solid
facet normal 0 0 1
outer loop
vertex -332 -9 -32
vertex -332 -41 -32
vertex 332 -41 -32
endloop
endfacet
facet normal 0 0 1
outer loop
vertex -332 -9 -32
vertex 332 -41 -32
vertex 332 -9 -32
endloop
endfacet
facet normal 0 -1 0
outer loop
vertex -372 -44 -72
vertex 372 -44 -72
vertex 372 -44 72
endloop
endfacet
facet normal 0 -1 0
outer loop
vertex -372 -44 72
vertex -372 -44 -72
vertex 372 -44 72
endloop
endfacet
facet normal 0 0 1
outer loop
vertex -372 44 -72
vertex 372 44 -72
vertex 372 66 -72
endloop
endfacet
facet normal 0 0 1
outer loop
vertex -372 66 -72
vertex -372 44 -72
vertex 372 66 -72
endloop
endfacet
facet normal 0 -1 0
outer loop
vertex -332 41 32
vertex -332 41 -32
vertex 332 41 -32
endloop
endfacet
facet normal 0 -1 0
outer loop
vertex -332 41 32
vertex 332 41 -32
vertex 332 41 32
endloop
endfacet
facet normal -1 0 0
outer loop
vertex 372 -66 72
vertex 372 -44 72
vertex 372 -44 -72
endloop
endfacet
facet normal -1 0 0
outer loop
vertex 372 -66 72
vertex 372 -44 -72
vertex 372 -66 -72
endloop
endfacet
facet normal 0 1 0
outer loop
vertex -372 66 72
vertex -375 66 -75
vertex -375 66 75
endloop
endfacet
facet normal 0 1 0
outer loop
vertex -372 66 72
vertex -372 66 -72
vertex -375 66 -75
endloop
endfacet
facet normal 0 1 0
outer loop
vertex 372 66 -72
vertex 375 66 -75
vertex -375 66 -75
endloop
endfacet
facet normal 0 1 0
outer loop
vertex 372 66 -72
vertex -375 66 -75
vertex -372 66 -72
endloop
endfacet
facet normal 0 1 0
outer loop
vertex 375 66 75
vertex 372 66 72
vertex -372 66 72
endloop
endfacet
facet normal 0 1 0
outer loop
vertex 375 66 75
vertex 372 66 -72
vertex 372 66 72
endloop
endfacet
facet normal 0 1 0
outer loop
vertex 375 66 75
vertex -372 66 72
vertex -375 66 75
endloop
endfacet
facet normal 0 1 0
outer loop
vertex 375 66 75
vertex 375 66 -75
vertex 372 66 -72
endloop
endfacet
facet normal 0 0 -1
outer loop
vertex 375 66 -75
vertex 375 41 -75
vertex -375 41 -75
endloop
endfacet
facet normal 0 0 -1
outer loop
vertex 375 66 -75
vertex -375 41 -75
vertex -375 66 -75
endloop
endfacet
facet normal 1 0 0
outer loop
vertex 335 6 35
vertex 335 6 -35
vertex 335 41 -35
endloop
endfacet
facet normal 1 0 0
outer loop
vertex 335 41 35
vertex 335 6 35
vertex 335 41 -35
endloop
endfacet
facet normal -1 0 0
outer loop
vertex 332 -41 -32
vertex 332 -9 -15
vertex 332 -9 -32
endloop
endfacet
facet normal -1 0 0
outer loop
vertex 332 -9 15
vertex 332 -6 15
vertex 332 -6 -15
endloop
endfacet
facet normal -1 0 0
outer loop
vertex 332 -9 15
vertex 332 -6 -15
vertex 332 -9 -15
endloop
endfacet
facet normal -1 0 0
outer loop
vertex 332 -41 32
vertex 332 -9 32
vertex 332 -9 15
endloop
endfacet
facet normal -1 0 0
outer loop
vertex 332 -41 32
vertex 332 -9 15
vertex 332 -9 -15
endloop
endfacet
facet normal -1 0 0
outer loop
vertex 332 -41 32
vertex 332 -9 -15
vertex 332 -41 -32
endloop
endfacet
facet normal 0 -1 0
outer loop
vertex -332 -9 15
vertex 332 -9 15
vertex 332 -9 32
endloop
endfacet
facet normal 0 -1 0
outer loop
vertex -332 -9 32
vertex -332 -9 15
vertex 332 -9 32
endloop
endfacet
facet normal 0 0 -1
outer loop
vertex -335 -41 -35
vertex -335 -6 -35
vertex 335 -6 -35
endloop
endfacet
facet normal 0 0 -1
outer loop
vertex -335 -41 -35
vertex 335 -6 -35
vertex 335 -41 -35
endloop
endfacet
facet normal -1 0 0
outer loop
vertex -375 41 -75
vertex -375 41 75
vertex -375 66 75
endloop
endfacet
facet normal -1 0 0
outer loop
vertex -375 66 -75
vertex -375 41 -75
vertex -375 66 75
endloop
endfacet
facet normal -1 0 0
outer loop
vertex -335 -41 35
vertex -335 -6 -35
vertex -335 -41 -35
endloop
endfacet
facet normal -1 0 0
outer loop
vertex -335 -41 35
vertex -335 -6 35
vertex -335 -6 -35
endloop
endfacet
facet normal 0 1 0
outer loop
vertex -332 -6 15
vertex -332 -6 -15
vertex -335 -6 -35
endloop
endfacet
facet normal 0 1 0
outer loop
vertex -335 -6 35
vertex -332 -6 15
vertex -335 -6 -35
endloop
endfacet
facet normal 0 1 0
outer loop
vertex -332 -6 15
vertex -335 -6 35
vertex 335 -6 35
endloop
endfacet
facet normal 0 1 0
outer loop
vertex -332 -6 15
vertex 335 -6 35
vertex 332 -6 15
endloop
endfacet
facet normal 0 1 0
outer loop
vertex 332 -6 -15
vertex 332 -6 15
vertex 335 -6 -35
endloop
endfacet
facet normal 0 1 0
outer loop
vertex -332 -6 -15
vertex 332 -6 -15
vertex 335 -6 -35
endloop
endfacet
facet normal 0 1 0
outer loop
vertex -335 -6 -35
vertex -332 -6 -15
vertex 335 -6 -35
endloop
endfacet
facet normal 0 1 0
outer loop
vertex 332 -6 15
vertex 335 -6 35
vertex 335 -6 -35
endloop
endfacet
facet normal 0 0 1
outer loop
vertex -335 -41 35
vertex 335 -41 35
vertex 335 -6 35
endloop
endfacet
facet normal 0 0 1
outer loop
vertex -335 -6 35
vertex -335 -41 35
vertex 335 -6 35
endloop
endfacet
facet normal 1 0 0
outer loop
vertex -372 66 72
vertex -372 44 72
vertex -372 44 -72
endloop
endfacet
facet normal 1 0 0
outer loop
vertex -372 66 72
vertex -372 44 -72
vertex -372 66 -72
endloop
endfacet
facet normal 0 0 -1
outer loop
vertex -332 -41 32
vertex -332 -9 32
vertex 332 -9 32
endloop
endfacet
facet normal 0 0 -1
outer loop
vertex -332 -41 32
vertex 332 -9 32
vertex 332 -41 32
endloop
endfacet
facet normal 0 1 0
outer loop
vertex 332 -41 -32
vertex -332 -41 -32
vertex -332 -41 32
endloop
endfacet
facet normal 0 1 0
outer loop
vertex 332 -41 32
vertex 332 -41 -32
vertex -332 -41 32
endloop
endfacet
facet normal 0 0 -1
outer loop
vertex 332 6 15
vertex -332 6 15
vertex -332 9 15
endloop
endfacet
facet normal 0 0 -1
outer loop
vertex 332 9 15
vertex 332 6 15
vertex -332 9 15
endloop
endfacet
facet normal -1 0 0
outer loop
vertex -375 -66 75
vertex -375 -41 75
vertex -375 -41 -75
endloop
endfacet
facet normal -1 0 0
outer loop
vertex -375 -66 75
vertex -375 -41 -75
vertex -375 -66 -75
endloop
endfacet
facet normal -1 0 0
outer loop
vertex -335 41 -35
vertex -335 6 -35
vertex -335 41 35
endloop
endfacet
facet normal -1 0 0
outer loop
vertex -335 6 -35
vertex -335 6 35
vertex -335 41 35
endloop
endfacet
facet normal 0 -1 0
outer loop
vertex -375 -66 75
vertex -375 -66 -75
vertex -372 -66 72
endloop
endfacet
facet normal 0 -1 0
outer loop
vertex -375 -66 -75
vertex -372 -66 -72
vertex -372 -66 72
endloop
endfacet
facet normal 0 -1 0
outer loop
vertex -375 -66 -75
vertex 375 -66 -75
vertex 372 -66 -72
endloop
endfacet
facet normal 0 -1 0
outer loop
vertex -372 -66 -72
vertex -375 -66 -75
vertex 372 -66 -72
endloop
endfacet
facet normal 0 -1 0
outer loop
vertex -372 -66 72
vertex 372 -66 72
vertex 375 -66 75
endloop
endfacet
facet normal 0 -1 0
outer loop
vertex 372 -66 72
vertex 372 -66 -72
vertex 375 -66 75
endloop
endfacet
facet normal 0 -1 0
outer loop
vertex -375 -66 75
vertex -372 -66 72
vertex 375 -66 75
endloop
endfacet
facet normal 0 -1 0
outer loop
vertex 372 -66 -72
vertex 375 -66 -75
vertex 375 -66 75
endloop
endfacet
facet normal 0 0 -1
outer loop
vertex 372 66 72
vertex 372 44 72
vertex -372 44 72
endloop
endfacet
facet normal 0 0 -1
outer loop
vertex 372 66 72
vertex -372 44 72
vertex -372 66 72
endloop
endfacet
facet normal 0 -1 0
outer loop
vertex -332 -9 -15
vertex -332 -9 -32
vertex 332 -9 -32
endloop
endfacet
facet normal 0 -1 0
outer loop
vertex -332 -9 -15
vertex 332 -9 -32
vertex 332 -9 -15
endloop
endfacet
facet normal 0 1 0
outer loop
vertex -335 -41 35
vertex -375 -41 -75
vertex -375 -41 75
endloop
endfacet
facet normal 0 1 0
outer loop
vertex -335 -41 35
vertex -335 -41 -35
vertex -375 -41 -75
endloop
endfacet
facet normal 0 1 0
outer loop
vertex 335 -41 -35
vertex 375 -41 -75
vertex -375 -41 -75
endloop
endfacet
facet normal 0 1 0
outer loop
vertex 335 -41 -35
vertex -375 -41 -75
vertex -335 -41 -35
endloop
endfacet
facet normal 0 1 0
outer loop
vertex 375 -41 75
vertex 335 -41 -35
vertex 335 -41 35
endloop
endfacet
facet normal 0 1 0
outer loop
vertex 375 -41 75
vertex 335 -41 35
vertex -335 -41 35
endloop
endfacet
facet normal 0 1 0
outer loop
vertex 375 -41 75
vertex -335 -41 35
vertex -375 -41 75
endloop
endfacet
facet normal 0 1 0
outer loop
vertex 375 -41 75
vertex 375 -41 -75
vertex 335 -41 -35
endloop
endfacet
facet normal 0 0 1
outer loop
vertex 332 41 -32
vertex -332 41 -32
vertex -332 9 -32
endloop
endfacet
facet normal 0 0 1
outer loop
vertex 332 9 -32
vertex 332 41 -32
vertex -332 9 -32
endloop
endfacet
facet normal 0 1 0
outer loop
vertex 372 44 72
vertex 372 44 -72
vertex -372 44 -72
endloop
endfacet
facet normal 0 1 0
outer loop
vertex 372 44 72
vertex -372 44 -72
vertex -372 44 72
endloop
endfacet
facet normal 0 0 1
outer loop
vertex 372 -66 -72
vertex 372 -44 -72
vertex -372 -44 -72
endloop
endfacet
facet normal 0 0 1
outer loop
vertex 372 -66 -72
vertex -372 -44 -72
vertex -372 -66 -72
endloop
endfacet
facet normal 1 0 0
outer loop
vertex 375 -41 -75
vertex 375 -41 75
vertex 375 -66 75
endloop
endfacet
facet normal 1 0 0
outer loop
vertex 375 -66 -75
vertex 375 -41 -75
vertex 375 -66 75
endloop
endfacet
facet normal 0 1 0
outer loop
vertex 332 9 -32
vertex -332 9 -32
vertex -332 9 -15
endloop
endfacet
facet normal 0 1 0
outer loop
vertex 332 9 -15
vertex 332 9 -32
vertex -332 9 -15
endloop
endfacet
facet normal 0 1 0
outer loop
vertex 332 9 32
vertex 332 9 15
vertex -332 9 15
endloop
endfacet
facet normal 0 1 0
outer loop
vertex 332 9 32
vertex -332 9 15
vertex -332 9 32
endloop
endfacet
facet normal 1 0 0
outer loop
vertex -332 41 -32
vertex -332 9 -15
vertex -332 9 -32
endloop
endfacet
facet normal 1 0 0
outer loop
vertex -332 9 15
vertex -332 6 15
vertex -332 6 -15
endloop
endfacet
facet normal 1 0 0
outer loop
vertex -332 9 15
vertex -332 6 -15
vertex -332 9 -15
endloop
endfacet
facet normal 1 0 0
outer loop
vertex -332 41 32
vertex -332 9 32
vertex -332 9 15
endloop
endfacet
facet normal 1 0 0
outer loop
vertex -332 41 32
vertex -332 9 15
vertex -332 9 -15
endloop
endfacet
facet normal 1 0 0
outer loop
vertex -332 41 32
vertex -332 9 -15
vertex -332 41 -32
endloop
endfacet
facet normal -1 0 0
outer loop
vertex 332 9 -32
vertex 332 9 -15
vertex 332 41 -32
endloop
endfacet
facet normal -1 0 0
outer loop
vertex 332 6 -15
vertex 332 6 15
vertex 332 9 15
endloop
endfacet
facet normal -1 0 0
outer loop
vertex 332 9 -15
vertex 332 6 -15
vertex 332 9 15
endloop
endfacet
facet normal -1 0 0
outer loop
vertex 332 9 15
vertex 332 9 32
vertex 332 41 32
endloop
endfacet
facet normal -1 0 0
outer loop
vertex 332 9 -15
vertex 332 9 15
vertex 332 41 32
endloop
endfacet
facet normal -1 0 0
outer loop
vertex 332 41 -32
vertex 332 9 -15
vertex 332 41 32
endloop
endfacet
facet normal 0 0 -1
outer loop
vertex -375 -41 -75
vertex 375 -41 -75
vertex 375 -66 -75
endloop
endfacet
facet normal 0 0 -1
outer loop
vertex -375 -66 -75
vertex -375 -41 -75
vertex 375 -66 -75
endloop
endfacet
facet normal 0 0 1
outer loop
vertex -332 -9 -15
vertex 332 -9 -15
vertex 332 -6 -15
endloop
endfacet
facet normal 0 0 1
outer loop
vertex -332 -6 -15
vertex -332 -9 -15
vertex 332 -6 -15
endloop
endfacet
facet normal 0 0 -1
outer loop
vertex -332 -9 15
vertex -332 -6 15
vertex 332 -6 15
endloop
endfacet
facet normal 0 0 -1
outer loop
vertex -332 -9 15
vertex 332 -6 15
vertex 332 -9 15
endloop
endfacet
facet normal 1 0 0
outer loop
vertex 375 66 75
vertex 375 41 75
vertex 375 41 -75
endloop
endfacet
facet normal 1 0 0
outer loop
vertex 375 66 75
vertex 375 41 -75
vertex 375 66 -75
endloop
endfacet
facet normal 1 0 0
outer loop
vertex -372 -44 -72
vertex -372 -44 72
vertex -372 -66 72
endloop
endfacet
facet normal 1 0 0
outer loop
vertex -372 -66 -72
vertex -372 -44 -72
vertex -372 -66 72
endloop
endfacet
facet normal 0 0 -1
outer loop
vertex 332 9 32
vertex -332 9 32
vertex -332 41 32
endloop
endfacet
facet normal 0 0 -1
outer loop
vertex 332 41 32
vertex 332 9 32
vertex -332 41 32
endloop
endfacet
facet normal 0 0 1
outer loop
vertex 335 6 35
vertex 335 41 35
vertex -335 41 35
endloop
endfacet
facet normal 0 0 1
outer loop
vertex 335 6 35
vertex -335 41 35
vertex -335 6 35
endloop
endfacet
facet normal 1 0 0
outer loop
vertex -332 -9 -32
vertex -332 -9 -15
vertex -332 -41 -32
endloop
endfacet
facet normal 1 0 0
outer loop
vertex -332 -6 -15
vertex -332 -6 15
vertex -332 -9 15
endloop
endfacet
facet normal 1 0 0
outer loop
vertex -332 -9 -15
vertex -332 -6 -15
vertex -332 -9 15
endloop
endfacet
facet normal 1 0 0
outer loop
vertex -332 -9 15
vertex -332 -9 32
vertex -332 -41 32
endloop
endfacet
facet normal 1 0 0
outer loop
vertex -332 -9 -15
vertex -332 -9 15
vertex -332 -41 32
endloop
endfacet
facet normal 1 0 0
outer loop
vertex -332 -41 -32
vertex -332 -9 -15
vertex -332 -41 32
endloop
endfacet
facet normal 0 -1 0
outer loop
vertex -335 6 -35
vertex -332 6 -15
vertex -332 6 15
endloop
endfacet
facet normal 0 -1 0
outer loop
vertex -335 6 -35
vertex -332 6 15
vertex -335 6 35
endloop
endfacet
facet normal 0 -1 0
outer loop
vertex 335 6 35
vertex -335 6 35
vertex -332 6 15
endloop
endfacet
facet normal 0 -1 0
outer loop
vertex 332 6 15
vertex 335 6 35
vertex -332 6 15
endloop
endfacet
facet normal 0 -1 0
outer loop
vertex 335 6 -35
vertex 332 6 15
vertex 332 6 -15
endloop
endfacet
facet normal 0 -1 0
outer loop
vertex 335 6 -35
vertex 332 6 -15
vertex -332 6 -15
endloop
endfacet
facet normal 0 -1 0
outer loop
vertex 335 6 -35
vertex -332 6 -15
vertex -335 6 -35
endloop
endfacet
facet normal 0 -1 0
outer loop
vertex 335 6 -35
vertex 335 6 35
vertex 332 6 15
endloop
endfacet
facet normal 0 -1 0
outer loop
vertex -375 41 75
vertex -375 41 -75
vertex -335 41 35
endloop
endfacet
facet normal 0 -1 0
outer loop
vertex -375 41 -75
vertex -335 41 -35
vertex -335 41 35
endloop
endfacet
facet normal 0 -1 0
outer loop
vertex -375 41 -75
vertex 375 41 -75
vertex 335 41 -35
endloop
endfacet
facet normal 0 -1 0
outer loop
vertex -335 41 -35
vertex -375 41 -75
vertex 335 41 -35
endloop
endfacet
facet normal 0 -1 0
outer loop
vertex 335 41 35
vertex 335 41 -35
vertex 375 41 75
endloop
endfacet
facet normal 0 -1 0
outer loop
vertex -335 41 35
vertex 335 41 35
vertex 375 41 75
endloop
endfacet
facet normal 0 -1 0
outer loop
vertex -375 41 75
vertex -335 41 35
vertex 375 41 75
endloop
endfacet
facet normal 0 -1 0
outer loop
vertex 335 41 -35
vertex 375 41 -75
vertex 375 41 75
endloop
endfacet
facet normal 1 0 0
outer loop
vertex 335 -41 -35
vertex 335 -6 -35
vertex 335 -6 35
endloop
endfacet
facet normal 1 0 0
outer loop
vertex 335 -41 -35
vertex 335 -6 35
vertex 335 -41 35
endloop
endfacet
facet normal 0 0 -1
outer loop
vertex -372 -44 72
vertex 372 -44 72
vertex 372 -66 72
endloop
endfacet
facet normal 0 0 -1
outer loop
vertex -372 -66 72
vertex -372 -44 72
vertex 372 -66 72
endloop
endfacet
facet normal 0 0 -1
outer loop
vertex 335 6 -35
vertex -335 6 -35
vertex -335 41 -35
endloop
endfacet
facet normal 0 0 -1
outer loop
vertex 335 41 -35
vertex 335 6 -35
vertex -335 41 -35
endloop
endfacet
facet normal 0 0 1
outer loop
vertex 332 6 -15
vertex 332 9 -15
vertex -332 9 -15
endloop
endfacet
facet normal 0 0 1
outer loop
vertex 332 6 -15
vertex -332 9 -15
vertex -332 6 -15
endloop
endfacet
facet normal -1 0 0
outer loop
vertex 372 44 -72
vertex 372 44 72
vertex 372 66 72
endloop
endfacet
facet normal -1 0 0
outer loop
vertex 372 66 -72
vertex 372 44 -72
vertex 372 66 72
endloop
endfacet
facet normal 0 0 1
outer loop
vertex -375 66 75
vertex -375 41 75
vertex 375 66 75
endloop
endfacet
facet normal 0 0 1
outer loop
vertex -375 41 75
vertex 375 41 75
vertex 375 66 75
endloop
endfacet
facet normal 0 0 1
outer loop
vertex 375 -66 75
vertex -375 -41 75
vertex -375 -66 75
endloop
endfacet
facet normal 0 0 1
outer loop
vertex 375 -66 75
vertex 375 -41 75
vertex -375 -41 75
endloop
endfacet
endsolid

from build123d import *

# Parameters (mm, degrees)
F0_W     = 25
F0_H     = 150
F1_DEPTH = 375
F2_T     = -3
F4_DEPTH = 335
F5_W     = 35
F5_H     = 70
F6_DEPTH = 3


# Not quite as in the source:
# - a pattern or mirror of a feature is missing from the dataset's text; its kind, count and spacing are read off the source's solid


with BuildPart() as f1:
    # F0 (on Right) → F1 (new body, symmetric)
    with BuildSketch(Plane.YZ):
        with Locations((53.5, 0)):
            Rectangle(F0_W, F0_H)
    extrude(amount=F1_DEPTH, both=True)

    # F2
    f2_openings = [f1.faces().sort_by_distance(p)[0] for p in [
        (0, 66, 0),
    ]]
    offset(amount=F2_T, openings=f2_openings)

    # F3 (on Right) → F4 (join, symmetric)
    with BuildSketch(Plane.YZ):
        Polygon((41, 32), (41, 35), (6, 35), (6, 15), (9, 15), (9, 32), align=None)
        Polygon((6, -35), (41, -35), (41, -32), (9, -32), (9, -15), (6, -15), align=None)
    extrude(amount=F4_DEPTH, both=True)

    # F5 (on face) → F6 (join)
    with BuildSketch(Plane.YZ.offset(335)):
        with Locations((23.5, 0)):
            Rectangle(F5_W, F5_H)
    f6 = extrude(amount=-F6_DEPTH)

    # F6_copies: F6 across plane
    add(f6.mirror(Plane(origin=(0, 0, 0), x_dir=(0, 0, -1), z_dir=(-1, 0, 0))))


with BuildPart() as f7_1:
    # F7: instance of F1
    add(f1.part.mirror(Plane.XZ))


solid = Compound([f1.part, f7_1.part])
